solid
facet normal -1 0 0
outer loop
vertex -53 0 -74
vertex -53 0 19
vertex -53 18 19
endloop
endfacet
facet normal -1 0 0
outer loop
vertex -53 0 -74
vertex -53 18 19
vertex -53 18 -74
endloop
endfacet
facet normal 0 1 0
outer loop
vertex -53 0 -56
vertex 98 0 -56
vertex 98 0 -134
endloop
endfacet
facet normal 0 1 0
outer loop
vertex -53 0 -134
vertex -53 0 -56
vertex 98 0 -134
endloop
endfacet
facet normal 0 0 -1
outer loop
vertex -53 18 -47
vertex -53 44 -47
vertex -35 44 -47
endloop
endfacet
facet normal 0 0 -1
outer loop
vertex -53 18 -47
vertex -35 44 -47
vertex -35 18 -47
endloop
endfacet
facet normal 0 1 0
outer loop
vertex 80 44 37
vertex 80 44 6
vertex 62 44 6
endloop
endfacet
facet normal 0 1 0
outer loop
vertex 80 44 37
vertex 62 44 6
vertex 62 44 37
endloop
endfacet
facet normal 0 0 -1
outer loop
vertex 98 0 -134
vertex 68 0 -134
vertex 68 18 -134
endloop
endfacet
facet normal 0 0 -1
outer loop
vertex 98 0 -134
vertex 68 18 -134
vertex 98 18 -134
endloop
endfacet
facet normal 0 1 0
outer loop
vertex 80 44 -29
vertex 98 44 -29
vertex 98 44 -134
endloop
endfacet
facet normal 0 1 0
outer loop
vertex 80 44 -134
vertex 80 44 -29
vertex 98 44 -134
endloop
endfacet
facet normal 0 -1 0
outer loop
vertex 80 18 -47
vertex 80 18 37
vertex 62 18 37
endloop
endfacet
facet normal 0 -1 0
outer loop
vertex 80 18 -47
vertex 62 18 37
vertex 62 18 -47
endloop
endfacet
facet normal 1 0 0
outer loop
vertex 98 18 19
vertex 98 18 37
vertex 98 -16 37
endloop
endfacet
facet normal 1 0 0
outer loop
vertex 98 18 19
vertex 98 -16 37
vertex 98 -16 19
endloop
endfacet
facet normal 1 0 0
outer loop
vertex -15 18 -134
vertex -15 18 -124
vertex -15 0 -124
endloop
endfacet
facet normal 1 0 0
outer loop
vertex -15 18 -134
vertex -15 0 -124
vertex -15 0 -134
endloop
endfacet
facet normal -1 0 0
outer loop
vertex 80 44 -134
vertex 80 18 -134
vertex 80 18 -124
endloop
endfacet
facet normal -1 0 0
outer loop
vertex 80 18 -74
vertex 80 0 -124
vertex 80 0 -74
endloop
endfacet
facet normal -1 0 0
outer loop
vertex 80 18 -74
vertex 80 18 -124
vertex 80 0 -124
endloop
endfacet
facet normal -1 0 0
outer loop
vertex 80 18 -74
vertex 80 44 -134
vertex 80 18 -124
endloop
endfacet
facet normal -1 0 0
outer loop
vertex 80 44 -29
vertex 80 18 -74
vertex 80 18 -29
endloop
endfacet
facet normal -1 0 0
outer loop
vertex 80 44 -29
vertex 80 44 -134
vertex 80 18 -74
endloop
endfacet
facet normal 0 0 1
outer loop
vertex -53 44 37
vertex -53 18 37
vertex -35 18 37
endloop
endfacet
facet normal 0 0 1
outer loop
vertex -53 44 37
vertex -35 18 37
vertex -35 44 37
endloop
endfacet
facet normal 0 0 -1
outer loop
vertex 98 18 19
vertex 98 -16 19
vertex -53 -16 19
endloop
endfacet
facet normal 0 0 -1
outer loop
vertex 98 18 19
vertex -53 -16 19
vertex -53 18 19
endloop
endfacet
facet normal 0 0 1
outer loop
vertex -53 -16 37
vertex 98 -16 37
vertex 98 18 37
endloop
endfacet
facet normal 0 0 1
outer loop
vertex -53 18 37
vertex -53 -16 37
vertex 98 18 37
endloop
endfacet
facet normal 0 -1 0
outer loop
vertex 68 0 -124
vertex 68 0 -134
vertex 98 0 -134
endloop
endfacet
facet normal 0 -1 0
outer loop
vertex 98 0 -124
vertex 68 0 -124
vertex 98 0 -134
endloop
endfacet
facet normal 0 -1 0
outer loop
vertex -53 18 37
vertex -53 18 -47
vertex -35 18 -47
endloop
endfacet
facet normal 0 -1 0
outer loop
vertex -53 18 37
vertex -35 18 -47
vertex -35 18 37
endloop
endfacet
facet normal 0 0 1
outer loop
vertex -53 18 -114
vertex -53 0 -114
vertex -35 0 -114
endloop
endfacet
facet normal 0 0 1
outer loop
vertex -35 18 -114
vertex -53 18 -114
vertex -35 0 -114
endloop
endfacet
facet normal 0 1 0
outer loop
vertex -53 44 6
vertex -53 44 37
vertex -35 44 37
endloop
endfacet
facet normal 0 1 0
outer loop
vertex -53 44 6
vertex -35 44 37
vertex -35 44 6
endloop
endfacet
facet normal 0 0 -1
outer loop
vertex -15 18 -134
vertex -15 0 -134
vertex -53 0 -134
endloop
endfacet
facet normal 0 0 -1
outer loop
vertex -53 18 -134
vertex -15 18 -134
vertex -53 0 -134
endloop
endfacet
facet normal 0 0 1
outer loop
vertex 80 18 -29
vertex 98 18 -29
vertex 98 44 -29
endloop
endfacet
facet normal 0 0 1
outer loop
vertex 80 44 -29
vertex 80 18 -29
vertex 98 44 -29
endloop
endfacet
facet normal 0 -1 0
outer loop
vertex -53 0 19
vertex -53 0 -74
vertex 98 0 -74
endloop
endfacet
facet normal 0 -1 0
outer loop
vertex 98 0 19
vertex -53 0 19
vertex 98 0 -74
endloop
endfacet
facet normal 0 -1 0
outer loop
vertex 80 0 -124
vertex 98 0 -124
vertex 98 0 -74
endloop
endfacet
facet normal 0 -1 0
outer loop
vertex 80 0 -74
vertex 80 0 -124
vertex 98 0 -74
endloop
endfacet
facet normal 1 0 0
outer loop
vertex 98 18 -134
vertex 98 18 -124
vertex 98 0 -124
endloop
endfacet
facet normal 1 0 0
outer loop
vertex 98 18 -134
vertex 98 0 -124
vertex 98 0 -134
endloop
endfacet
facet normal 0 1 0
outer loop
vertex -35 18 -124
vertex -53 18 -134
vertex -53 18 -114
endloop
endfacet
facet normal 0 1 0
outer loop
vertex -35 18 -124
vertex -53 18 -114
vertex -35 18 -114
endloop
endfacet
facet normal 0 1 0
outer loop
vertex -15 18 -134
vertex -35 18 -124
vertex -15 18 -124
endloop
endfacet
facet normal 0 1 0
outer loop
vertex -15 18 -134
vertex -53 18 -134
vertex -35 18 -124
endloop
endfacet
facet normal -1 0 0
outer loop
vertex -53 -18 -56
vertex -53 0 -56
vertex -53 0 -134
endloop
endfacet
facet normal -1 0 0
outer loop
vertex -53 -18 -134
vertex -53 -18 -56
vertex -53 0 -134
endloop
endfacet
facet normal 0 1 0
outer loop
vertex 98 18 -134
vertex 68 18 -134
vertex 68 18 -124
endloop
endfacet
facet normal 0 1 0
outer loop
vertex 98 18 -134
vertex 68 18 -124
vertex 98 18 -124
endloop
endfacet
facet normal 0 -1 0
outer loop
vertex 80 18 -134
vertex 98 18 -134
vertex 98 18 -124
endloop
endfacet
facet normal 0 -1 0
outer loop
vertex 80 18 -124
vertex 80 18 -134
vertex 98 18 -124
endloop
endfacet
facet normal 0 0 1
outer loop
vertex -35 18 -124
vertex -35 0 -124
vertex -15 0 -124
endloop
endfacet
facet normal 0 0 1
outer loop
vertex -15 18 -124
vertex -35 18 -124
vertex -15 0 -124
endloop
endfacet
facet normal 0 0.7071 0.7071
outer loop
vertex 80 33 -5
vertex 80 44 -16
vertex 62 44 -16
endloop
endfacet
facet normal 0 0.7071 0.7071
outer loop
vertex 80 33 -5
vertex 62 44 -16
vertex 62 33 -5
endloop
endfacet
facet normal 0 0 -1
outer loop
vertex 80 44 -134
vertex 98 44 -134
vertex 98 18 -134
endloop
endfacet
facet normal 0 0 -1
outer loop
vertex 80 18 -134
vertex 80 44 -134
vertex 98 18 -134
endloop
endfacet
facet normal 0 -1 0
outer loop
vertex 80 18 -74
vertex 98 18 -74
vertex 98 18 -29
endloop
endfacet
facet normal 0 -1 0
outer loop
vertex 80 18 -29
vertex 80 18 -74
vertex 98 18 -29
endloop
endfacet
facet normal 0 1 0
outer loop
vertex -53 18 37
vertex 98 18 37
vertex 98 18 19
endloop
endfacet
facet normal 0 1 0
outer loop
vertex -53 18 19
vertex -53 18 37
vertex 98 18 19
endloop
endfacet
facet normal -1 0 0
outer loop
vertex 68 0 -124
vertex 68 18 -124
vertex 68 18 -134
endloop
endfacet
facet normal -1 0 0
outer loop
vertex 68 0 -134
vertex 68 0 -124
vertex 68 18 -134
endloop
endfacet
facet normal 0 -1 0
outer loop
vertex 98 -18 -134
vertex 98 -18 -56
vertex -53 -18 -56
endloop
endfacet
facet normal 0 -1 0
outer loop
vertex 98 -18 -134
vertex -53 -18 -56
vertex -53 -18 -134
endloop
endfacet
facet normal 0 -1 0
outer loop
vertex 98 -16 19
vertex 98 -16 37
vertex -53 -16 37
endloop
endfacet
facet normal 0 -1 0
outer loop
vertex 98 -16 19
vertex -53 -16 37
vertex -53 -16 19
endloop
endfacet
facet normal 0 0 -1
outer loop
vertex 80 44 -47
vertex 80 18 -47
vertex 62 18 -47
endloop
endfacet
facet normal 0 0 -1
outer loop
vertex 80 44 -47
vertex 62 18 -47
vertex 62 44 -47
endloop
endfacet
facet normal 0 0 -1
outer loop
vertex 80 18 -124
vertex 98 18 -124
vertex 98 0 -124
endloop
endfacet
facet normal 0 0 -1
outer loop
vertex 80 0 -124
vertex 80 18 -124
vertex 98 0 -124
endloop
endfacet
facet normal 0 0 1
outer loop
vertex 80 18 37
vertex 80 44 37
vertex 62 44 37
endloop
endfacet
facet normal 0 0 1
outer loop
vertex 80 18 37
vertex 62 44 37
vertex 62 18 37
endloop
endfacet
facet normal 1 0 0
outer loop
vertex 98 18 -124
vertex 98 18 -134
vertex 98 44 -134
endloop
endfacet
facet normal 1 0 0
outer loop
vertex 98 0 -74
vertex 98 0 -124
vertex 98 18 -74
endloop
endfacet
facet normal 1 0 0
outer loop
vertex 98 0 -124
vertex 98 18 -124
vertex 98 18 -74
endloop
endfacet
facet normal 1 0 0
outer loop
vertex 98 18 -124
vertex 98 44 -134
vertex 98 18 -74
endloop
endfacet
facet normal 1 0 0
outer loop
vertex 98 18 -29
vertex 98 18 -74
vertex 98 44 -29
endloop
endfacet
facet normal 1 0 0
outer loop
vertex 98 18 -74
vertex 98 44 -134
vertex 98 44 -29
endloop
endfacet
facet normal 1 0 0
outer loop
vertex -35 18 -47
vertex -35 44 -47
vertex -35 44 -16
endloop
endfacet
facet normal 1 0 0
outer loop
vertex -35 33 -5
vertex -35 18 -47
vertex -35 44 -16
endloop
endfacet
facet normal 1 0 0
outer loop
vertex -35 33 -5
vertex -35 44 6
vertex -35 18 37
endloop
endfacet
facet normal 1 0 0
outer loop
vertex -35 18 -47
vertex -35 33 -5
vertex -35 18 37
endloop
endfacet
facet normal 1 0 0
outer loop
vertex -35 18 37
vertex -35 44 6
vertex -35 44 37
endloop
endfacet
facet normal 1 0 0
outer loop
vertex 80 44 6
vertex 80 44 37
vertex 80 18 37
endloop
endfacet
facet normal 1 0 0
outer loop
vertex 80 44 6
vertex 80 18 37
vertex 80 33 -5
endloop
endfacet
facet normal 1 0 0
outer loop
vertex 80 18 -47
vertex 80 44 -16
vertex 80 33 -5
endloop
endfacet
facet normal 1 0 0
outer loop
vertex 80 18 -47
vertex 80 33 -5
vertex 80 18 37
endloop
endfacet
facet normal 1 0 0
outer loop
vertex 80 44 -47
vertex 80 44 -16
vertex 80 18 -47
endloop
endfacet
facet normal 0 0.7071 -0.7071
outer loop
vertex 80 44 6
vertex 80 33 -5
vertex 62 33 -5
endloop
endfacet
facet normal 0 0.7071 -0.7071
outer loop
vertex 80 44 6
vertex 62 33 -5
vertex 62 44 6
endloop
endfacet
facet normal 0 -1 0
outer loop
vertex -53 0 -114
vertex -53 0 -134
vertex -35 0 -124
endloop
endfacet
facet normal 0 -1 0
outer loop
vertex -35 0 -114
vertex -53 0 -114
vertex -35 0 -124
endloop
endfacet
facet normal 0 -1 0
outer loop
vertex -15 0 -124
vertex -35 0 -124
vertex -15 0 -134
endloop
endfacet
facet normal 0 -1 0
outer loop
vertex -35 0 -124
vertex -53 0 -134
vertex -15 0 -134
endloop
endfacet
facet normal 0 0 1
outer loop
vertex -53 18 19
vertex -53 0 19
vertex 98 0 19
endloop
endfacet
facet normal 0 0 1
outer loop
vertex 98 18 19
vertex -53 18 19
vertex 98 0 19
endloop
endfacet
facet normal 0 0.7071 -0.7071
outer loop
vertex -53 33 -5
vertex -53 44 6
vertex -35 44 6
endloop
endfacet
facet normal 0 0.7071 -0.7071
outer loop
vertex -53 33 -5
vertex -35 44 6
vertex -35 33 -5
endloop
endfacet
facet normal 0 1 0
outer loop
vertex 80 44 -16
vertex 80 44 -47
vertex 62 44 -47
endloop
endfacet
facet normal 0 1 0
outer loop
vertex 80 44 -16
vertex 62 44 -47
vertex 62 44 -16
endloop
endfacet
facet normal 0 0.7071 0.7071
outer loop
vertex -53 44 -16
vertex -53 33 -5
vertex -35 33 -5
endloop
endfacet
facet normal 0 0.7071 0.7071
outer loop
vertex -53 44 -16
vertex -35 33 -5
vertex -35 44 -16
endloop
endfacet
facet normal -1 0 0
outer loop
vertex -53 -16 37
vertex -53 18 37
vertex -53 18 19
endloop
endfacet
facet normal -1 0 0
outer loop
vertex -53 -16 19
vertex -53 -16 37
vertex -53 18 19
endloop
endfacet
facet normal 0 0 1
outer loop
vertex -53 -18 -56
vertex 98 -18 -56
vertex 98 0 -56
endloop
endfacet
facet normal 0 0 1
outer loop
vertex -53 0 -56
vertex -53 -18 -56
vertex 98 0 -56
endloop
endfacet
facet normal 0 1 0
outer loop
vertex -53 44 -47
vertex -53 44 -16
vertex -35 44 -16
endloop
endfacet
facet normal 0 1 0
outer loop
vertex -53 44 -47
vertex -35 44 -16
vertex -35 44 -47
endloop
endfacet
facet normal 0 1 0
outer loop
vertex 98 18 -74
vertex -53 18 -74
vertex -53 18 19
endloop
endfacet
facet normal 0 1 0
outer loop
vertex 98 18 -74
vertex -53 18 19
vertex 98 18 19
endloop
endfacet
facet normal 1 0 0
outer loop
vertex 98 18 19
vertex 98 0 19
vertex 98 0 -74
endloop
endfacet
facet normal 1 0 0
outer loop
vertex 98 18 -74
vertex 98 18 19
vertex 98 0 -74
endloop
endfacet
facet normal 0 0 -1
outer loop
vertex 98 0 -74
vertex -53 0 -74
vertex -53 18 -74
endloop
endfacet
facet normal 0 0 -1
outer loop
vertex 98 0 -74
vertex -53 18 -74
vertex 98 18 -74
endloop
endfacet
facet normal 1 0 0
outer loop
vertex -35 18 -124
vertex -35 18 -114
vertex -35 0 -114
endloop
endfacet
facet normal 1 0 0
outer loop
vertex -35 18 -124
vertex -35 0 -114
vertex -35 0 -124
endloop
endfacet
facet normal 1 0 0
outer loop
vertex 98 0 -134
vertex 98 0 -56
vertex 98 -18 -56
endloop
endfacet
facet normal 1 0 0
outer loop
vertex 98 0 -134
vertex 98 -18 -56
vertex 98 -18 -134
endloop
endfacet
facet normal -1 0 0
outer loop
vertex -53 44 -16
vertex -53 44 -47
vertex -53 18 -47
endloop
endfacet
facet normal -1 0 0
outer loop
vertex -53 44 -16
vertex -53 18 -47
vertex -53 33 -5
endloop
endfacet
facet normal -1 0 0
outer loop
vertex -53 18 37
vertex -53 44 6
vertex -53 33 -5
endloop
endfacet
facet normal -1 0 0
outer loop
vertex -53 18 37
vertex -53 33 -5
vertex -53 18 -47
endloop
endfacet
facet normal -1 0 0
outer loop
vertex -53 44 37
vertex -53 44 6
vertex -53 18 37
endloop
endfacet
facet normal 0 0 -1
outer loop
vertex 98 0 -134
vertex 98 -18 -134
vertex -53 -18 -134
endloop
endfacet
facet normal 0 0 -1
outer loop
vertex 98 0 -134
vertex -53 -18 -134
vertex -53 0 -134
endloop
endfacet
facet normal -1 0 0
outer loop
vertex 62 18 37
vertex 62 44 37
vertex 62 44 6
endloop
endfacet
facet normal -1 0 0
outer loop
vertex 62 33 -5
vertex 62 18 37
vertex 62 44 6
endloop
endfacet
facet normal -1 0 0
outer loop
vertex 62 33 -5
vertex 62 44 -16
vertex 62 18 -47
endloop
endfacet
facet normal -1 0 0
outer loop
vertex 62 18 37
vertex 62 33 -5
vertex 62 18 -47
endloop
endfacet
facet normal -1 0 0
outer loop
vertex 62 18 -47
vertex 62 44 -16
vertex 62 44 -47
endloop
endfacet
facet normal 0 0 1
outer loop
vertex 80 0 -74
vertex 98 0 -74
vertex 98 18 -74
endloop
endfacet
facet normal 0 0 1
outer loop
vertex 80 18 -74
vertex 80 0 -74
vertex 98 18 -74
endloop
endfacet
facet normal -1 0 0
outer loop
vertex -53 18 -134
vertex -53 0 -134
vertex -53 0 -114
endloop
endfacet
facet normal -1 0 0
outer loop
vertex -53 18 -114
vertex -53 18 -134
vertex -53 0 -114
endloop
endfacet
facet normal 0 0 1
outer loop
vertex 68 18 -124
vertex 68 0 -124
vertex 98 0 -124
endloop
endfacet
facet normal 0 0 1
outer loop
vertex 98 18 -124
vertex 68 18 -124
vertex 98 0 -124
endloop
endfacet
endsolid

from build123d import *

# Parameters (mm, degrees)
SKETCH1_W             = 151
SKETCH1_H             = 93
BOSS_EXTRUDE1_DEPTH   = 18
BOSS_EXTRUDE2_DEPTH   = 18
SKETCH3_W             = 18
SKETCH3_H             = 34
BOSS_EXTRUDE3_DEPTH   = 151
SKETCH3_W_2           = 78
SKETCH3_H_2           = 18
BOSS_EXTRUDE3_2_DEPTH = 151
BOSS_EXTRUDE4_DEPTH   = 18
BOSS_EXTRUDE5_DEPTH   = 18
BOSS_EXTRUDE6_DEPTH   = 18
SKETCH7_W             = 30
SKETCH7_H             = 10
BOSS_EXTRUDE6_2_DEPTH = 18


with BuildPart() as part:
    # Sketch1 → Boss-Extrude1 (new body)
    with BuildSketch(Plane(origin=(0, 0, 0), x_dir=(1, 0, 0), z_dir=(0, 1, 0))):
        with Locations((22.5, 27.5)):
            Rectangle(SKETCH1_W, SKETCH1_H)
    extrude(amount=BOSS_EXTRUDE1_DEPTH)


with BuildPart() as body_2:
    # Sketch2 → Boss-Extrude2 (new body)
    with BuildSketch(Plane(origin=(80, 0, 0), x_dir=(0, 0, -1), z_dir=(1, 0, 0))):
        Polygon((-37, 18), (47, 18), (47, 44), (16, 44), (5, 33), (-6, 44), (-37, 44), align=None)
    extrude(amount=-BOSS_EXTRUDE2_DEPTH)


with BuildPart() as body_3:
    # Sketch3 → Boss-Extrude3 (new body)
    with BuildSketch(Plane(origin=(98, 0, 0), x_dir=(0, 0, -1), z_dir=(1, 0, 0))):
        with Locations((-28, 1)):
            Rectangle(SKETCH3_W, SKETCH3_H)
    extrude(amount=-BOSS_EXTRUDE3_DEPTH)


with BuildPart() as body_4:
    # Sketch3 → Boss-Extrude3 2 (new body)
    with BuildSketch(Plane(origin=(98, 0, 0), x_dir=(0, 0, -1), z_dir=(1, 0, 0))):
        with Locations((95, -9)):
            Rectangle(SKETCH3_W_2, SKETCH3_H_2)
    extrude(amount=-BOSS_EXTRUDE3_2_DEPTH)


with BuildPart() as body_5:
    # Sketch4 → Boss-Extrude4 (new body)
    with BuildSketch(Plane.ZY.offset(53)):
        Polygon((37, 18), (37, 44), (6, 44), (-5, 33), (-16, 44), (-47, 44), (-47, 18), align=None)
    extrude(amount=-BOSS_EXTRUDE4_DEPTH)


with BuildPart() as body_6:
    # Sketch5 → Boss-Extrude5 (new body)
    with BuildSketch(Plane(origin=(98, 0, 0), x_dir=(0, 0, -1), z_dir=(1, 0, 0))):
        Polygon((124, 0), (74, 0), (74, 18), (29, 18), (29, 44), (134, 44), (134, 18), (124, 18), align=None)
    extrude(amount=-BOSS_EXTRUDE5_DEPTH)


with BuildPart() as body_7:
    # Sketch7 → Boss-Extrude6 (new body)
    with BuildSketch(Plane(origin=(0, 0, 0), x_dir=(1, 0, 0), z_dir=(0, 1, 0))):
        Polygon((-35, 114), (-35, 124), (-15, 124), (-15, 134), (-53, 134), (-53, 114), align=None)
    extrude(amount=BOSS_EXTRUDE6_DEPTH)


with BuildPart() as body_8:
    # Sketch7 → Boss-Extrude6 2 (new body)
    with BuildSketch(Plane(origin=(0, 0, 0), x_dir=(1, 0, 0), z_dir=(0, 1, 0))):
        with Locations((83, 129)):
            Rectangle(SKETCH7_W, SKETCH7_H)
    extrude(amount=BOSS_EXTRUDE6_2_DEPTH)


solid = Compound([part.part, body_2.part, body_3.part, body_4.part, body_5.part, body_6.part, body_7.part, body_8.part])
